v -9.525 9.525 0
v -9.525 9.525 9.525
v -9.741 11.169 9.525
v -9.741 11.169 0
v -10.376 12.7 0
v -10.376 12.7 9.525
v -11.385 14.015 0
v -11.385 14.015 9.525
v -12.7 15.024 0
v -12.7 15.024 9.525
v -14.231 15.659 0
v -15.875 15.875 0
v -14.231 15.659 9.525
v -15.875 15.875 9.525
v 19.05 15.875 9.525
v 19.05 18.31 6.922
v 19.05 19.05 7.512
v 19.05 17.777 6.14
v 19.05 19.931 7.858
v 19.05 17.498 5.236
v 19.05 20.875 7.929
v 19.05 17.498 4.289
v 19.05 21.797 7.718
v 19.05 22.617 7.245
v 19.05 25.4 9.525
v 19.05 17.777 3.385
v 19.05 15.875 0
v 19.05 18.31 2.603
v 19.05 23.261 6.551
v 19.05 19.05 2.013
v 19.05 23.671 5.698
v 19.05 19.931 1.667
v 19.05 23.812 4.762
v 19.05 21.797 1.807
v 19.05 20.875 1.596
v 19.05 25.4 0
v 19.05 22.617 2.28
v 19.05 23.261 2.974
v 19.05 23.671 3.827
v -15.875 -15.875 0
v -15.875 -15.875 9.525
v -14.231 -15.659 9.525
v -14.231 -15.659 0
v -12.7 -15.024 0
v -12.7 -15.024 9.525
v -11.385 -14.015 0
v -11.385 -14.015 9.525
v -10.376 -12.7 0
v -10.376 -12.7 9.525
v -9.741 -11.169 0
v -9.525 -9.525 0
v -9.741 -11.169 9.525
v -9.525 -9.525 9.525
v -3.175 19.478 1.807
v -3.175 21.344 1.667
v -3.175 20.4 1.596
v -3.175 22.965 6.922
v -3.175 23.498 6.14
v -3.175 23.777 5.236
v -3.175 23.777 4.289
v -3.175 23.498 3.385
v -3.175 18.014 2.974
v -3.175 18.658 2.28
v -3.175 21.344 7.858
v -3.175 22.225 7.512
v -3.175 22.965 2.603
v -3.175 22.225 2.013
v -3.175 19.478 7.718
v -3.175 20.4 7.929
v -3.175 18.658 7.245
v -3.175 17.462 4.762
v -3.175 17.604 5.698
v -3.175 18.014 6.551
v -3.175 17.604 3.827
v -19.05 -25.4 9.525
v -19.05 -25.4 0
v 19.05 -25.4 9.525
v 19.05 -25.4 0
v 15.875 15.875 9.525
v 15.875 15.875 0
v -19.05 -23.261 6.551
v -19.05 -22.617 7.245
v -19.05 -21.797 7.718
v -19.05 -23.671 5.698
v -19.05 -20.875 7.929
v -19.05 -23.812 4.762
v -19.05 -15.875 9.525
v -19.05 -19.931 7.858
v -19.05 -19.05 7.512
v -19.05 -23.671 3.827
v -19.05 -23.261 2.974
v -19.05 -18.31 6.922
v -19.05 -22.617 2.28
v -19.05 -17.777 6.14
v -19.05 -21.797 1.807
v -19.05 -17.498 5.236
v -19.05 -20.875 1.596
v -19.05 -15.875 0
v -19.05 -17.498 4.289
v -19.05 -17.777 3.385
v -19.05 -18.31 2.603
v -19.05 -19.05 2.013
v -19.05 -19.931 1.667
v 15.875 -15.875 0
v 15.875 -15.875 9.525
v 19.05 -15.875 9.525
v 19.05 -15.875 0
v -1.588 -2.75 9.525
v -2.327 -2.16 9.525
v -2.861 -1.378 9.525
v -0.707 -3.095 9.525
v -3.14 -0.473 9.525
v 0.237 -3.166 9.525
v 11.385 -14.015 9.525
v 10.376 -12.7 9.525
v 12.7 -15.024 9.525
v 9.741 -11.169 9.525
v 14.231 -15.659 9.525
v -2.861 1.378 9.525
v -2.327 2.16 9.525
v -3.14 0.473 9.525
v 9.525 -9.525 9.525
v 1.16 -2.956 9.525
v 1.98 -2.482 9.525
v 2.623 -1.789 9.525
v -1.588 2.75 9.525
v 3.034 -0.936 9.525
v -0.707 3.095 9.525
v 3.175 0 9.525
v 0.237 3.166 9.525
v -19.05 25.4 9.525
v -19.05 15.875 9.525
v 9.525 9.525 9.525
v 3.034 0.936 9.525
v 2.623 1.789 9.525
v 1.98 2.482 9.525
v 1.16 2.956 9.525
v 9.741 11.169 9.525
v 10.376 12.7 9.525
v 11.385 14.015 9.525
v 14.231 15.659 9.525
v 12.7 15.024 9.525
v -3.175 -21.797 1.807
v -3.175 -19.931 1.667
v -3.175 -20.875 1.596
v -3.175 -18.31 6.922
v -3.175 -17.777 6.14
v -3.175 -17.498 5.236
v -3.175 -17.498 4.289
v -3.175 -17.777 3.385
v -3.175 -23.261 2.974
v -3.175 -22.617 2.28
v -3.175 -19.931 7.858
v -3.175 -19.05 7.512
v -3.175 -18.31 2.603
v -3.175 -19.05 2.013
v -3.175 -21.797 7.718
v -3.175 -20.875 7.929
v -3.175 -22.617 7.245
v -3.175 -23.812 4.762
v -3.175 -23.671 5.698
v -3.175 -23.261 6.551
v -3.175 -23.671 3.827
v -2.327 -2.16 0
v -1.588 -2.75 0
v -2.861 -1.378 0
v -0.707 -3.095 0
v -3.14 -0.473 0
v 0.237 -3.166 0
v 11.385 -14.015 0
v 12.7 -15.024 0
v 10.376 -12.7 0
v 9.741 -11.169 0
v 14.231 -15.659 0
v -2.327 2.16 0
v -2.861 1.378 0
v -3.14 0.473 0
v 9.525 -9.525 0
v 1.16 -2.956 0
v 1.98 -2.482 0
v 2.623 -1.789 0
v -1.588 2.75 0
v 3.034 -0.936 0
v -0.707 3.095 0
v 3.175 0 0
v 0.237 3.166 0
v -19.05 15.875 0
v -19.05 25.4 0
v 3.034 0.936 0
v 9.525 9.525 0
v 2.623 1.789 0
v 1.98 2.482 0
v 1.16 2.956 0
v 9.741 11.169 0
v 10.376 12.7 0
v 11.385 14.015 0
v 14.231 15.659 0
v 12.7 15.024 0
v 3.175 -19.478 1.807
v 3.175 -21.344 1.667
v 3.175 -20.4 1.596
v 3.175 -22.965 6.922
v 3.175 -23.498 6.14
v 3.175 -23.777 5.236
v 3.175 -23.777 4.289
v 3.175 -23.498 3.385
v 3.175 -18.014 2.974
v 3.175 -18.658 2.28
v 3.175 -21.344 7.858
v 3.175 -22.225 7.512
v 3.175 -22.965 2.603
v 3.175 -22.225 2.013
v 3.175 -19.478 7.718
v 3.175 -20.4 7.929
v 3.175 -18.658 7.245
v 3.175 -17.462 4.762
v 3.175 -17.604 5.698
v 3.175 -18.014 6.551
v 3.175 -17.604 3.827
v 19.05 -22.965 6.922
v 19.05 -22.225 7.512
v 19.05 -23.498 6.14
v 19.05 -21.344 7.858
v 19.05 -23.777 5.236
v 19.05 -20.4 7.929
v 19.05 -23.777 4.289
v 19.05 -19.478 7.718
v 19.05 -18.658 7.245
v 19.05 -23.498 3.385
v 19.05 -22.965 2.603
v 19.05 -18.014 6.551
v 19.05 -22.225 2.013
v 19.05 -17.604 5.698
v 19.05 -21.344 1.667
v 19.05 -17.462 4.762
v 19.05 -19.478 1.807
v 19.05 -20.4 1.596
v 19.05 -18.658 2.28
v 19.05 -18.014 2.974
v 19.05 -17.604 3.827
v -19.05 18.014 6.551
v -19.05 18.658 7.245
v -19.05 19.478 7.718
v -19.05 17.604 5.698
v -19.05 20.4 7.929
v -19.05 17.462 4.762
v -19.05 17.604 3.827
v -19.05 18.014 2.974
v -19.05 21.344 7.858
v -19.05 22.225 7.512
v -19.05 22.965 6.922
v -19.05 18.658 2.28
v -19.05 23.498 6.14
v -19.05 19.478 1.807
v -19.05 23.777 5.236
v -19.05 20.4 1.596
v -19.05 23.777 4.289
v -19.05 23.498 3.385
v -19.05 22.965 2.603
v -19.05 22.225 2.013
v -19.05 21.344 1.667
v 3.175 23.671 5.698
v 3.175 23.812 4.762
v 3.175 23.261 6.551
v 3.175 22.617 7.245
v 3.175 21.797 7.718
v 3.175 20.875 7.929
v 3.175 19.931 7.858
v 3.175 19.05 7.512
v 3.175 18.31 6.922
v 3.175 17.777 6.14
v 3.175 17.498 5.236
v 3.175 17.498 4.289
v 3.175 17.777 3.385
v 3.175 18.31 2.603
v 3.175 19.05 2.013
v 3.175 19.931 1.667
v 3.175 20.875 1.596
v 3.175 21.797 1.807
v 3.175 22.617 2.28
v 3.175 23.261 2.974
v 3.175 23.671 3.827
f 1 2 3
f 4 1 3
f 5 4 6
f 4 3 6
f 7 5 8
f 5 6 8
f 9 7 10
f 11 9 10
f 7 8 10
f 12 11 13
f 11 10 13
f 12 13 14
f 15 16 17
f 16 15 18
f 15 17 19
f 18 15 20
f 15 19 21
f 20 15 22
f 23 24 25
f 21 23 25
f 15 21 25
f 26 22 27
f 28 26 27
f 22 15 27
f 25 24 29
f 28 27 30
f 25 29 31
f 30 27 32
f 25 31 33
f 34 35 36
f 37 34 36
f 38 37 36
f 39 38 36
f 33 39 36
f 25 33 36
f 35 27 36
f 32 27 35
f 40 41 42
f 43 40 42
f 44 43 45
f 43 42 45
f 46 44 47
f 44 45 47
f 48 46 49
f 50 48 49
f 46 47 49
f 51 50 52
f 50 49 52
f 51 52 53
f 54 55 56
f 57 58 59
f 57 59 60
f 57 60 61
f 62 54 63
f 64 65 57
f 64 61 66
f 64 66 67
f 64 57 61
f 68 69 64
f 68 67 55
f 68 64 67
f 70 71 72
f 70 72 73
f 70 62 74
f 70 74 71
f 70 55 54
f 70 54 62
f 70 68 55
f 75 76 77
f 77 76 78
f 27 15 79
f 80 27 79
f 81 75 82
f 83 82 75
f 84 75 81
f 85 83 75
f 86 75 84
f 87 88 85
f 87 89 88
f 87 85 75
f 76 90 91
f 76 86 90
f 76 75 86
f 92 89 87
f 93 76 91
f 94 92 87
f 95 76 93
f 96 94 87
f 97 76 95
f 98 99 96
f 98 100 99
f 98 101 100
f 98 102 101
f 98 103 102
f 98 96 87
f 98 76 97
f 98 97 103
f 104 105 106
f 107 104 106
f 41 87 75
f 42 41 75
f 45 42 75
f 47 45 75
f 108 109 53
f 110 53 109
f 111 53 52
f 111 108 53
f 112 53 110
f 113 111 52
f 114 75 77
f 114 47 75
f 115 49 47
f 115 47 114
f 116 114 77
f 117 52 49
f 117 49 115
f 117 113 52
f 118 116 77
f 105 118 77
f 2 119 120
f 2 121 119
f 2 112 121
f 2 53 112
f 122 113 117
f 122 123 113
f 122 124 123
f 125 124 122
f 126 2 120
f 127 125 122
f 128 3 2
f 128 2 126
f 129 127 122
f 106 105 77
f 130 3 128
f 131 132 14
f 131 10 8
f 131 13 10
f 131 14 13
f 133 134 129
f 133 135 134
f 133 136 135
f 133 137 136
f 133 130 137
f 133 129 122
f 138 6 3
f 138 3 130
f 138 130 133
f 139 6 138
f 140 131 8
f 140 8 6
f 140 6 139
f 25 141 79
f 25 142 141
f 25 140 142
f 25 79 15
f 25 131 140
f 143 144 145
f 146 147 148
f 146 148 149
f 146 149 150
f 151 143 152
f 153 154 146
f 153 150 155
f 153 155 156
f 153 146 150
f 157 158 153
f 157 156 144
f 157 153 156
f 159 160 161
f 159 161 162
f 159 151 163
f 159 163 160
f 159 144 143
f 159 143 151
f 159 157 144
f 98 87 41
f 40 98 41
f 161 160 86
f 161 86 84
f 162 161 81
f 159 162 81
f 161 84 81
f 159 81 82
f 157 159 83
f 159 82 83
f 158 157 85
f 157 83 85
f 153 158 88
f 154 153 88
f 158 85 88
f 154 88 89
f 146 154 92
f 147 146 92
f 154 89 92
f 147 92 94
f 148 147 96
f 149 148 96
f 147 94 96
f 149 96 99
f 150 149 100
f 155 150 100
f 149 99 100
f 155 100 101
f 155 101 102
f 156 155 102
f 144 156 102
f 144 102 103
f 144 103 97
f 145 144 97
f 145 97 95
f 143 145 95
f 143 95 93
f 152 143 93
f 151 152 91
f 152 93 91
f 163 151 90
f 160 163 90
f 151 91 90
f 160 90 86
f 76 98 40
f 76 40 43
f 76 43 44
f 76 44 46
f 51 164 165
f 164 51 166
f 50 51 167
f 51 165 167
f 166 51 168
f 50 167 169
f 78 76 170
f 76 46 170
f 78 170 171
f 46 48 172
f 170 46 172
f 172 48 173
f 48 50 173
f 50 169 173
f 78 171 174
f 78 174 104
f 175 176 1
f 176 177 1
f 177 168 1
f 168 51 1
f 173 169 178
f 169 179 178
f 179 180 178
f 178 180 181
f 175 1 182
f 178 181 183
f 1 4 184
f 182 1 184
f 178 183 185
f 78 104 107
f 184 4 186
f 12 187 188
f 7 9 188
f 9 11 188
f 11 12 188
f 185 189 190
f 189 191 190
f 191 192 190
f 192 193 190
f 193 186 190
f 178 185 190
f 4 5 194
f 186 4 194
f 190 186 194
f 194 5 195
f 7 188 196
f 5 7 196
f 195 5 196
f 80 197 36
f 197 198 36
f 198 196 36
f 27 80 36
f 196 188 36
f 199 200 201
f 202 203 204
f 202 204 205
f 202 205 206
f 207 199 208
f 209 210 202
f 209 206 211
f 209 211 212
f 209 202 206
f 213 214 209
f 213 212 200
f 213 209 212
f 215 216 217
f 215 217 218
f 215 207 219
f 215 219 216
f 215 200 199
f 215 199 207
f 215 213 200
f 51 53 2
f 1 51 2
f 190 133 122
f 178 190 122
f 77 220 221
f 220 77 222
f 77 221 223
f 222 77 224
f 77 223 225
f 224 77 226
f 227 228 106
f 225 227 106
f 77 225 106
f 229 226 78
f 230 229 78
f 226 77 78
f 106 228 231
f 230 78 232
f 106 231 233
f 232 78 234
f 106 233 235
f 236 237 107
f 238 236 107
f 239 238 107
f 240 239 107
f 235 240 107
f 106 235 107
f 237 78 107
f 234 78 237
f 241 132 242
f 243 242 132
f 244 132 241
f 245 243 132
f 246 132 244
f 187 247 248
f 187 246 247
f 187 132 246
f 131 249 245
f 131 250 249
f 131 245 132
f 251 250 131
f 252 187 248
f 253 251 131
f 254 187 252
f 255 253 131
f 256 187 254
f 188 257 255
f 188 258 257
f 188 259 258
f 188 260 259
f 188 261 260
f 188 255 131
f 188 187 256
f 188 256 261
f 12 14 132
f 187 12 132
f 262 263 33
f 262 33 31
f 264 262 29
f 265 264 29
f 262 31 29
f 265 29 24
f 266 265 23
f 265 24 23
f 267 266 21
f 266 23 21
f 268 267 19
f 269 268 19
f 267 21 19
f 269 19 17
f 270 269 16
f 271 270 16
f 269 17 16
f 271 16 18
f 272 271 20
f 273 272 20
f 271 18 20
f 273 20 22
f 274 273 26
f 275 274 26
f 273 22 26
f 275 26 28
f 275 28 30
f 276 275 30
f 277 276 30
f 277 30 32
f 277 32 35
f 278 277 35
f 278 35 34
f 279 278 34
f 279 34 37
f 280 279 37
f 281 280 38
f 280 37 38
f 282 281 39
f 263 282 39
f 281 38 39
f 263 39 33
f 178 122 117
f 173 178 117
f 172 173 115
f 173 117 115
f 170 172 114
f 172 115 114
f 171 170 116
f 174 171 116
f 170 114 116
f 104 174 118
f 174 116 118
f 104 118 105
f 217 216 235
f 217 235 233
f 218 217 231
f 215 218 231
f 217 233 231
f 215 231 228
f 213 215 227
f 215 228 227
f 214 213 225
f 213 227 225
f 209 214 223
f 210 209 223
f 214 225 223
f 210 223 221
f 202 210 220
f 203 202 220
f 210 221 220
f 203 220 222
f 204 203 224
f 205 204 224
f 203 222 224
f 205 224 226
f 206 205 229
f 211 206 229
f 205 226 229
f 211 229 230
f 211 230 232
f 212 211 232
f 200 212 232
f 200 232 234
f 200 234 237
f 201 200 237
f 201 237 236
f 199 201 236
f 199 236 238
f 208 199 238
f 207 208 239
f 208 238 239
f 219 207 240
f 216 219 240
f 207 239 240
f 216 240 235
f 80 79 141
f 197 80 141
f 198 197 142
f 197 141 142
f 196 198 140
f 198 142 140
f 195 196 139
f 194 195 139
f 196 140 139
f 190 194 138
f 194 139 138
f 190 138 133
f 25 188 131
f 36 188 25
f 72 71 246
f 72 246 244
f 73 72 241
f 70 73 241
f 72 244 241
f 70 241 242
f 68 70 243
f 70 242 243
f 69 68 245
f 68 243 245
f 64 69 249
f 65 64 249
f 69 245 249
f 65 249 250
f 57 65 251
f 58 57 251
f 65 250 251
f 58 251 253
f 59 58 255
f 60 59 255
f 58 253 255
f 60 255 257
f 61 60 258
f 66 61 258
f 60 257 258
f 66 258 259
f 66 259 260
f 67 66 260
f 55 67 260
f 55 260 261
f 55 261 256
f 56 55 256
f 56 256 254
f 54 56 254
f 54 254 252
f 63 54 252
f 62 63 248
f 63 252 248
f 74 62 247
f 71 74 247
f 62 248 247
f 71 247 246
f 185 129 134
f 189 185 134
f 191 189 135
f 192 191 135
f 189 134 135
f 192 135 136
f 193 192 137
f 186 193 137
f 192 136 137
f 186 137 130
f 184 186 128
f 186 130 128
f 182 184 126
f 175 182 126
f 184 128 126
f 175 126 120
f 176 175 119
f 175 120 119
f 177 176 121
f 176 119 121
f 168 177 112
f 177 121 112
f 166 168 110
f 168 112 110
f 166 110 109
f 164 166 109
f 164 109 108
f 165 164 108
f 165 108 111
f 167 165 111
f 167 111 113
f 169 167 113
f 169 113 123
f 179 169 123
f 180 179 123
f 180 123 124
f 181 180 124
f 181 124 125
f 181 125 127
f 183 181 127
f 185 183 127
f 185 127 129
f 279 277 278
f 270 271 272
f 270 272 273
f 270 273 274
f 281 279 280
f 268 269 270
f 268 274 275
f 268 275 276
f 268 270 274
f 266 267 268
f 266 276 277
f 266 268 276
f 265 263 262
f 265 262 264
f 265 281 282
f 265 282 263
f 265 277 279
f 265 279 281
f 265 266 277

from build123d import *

# Parameters (mm, degrees)
F0_W     = 38.1
F0_H     = 50.8
F1_DEPTH = 9.525
F3_DEPTH = 9.526
F4_R     = 3.175
F5_DEPTH = 15.875
F6_R     = 3.175
F7_DEPTH = 9.526
F8_R     = 3.175
F9_DEPTH = 15.875


with BuildPart() as f1:
    # F0 (on Top) → F1 (new body)
    with BuildSketch(Plane.XY):
        Rectangle(F0_W, F0_H)
    extrude(amount=F1_DEPTH)

    # F2 (on face) → F3 (cut, through all)
    with BuildSketch(Plane.XY.offset(9.525)):
        with BuildLine():
            Line((-15.875, 15.875), (-19.05, 15.875))
            Line((-19.05, 15.875), (-19.05, -15.875))
            Line((-19.05, -15.875), (-15.875, -15.875))
            ThreePointArc((-15.875, -15.875), (-11.384872, -14.015128), (-9.525, -9.525))
            Line((-9.525, -9.525), (-9.525, 9.525))
            ThreePointArc((-9.525, 9.525), (-11.384872, 14.015128), (-15.875, 15.875))
        make_face()
        with BuildLine():
            Line((19.05, 15.875), (15.875, 15.875))
            ThreePointArc((15.875, 15.875), (11.384872, 14.015128), (9.525, 9.525))
            Line((9.525, 9.525), (9.525, -9.525))
            ThreePointArc((9.525, -9.525), (11.384872, -14.015128), (15.875, -15.875))
            Line((15.875, -15.875), (19.05, -15.875))
            Line((19.05, -15.875), (19.05, 15.875))
        make_face()
    extrude(amount=-F3_DEPTH, mode=Mode.SUBTRACT)

    # F4 (on face) → F5 (cut)
    with BuildSketch(Plane(origin=(-19.05, 0, 0), x_dir=(0, -1, 0), z_dir=(-1, 0, 0))):
        with Locations((-20.6375, 4.7625)):
            Circle(F4_R)
        with Locations((20.6375, 4.7625)):
            Circle(F4_R)
    extrude(amount=-F5_DEPTH, mode=Mode.SUBTRACT)

    # F6 (on face) → F7 (cut, through all)
    with BuildSketch(Plane.XY.offset(9.525)):
        Circle(F6_R)
    extrude(amount=-F7_DEPTH, mode=Mode.SUBTRACT)

    # F8 (on face) → F9 (cut)
    with BuildSketch(Plane.YZ.offset(19.05)):
        with Locations((-20.6375, 4.7625)):
            Circle(F8_R)
        with Locations((20.6375, 4.7625)):
            Circle(F8_R)
    extrude(amount=-F9_DEPTH, mode=Mode.SUBTRACT)


solid = f1.part
